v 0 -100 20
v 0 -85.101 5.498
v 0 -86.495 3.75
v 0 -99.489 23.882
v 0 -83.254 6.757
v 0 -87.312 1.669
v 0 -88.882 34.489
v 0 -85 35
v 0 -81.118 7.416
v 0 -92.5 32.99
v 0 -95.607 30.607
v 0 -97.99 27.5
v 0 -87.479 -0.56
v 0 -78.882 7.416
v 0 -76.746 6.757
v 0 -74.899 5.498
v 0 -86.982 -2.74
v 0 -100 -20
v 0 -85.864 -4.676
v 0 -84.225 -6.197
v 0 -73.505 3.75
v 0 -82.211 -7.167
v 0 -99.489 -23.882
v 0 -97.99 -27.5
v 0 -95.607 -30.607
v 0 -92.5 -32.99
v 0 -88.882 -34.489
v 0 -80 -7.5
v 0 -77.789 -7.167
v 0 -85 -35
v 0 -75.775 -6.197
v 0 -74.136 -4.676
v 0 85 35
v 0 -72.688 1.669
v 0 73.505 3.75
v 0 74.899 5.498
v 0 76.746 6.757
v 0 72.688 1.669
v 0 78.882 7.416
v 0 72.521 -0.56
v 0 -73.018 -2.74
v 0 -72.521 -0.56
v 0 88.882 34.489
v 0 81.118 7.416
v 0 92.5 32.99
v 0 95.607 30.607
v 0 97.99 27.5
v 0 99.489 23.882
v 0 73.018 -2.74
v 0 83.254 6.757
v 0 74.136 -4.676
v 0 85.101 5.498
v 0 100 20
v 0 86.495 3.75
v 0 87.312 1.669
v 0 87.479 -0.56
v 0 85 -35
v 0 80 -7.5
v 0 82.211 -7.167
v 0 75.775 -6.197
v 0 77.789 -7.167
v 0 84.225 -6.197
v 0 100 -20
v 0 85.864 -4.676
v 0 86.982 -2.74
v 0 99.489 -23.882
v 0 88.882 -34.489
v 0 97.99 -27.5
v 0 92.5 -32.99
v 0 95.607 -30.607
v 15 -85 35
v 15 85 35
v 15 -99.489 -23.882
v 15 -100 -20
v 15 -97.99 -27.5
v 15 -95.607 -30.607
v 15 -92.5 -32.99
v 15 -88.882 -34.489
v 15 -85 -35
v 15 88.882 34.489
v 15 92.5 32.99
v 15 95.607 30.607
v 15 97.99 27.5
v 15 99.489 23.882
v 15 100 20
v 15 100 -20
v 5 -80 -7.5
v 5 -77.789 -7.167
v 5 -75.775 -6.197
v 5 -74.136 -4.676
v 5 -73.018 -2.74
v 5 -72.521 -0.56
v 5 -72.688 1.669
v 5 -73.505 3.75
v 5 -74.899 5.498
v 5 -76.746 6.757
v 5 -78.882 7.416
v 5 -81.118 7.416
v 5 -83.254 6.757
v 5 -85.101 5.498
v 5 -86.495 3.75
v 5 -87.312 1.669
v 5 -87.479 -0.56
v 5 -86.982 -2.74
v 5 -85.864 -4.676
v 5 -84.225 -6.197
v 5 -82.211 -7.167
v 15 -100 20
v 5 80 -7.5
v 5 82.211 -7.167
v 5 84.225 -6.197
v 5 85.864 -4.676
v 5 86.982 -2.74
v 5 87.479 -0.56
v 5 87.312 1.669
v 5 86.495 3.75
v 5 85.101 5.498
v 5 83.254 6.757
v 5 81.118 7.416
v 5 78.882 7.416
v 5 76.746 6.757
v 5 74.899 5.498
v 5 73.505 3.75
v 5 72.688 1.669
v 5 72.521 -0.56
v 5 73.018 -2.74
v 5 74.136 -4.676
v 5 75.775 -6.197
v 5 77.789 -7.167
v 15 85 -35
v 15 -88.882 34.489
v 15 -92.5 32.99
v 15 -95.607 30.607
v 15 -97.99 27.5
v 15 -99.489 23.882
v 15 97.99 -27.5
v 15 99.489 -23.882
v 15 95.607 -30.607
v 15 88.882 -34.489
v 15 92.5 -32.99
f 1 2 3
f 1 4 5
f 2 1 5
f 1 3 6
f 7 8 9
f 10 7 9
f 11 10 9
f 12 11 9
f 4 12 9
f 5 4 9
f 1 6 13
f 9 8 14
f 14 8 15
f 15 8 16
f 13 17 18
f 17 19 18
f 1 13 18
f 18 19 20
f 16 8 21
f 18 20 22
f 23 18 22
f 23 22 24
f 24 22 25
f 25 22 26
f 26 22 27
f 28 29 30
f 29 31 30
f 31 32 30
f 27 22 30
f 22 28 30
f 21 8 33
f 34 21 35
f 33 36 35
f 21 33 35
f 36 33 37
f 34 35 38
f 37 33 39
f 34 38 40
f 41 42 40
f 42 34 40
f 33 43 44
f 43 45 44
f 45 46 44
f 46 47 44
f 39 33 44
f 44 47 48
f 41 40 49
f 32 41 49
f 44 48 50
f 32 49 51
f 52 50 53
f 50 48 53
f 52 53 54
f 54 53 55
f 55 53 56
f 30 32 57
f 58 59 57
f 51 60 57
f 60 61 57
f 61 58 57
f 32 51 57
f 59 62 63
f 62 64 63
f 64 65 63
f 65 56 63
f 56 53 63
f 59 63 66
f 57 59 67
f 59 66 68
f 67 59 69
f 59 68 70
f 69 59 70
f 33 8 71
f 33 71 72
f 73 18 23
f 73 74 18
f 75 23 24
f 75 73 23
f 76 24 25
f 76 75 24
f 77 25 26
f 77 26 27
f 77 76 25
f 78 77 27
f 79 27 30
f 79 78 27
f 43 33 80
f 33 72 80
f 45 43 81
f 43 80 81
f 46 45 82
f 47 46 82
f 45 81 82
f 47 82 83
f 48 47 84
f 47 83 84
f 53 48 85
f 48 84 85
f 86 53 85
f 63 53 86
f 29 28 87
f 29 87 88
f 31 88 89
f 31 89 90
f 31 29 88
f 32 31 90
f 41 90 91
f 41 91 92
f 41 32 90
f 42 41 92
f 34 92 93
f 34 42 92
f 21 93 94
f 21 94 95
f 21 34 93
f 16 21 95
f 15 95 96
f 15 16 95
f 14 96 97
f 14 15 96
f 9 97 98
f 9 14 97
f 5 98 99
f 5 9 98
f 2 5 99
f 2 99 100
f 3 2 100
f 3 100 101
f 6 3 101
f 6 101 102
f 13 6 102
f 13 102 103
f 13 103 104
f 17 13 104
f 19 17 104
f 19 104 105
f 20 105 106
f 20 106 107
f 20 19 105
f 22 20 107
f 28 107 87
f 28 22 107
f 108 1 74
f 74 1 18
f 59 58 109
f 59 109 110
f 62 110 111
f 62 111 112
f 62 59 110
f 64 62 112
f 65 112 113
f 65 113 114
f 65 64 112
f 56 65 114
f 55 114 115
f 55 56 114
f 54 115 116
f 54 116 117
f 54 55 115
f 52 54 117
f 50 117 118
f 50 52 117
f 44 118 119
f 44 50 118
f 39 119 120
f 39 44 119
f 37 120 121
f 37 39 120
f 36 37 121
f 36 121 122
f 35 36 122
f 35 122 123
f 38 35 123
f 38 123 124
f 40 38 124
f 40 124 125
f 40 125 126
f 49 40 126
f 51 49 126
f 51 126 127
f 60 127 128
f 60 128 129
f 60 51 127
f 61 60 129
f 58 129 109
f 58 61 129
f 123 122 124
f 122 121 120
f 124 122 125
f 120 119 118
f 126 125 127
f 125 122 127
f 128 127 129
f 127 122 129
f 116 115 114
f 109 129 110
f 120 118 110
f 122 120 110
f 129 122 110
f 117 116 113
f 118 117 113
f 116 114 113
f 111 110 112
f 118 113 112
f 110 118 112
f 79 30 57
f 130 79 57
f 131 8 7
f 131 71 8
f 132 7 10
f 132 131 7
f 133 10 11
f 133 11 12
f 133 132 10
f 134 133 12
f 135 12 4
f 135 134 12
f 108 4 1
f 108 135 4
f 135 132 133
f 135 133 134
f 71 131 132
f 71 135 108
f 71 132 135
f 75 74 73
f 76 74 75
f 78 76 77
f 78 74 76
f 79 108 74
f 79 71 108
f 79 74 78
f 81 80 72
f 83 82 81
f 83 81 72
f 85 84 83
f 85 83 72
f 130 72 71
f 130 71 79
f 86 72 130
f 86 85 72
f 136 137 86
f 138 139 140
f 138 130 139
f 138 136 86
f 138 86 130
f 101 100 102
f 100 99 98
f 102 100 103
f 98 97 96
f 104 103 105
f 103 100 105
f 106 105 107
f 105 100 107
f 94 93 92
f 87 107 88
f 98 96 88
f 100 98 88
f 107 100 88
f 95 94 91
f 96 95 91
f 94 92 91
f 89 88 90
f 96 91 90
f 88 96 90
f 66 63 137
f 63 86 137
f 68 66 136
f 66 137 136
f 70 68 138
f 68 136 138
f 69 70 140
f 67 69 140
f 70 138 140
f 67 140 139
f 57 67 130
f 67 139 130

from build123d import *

# Parameters (mm, degrees)
SKETCH1_W           = 70
SKETCH1_H           = 200
BOSS_EXTRUDE1_DEPTH = 15
SKETCH1_3_R         = 7.5
CUT_EXTRUDE1_DEPTH  = 5
FILLET1_R           = 15


with BuildPart() as part:
    # Sketch1 → Boss-Extrude1 (new body)
    with BuildSketch(Plane(origin=(0, 0, 0), x_dir=(0, 0, -1), z_dir=(1, 0, 0))):
        Rectangle(SKETCH1_W, SKETCH1_H)
    extrude(amount=BOSS_EXTRUDE1_DEPTH)

    # Sketch1<3> → Cut-Extrude1 (cut)
    with BuildSketch(Plane(origin=(0, 0, 0), x_dir=(0, 0, -1), z_dir=(1, 0, 0))):
        with Locations((0, 80)):
            Circle(SKETCH1_3_R)
        with Locations((0, -80)):
            Circle(SKETCH1_3_R)
    extrude(amount=CUT_EXTRUDE1_DEPTH, mode=Mode.SUBTRACT)

    # Fillet1
    fillet1_edges = [part.edges().sort_by_distance(p)[0] for p in [
        (7.5, -100, -35),
        (7.5, -100, 35),
        (7.5, 100, 35),
        (7.5, 100, -35),
    ]]
    fillet(fillet1_edges, radius=FILLET1_R)


solid = part.part
